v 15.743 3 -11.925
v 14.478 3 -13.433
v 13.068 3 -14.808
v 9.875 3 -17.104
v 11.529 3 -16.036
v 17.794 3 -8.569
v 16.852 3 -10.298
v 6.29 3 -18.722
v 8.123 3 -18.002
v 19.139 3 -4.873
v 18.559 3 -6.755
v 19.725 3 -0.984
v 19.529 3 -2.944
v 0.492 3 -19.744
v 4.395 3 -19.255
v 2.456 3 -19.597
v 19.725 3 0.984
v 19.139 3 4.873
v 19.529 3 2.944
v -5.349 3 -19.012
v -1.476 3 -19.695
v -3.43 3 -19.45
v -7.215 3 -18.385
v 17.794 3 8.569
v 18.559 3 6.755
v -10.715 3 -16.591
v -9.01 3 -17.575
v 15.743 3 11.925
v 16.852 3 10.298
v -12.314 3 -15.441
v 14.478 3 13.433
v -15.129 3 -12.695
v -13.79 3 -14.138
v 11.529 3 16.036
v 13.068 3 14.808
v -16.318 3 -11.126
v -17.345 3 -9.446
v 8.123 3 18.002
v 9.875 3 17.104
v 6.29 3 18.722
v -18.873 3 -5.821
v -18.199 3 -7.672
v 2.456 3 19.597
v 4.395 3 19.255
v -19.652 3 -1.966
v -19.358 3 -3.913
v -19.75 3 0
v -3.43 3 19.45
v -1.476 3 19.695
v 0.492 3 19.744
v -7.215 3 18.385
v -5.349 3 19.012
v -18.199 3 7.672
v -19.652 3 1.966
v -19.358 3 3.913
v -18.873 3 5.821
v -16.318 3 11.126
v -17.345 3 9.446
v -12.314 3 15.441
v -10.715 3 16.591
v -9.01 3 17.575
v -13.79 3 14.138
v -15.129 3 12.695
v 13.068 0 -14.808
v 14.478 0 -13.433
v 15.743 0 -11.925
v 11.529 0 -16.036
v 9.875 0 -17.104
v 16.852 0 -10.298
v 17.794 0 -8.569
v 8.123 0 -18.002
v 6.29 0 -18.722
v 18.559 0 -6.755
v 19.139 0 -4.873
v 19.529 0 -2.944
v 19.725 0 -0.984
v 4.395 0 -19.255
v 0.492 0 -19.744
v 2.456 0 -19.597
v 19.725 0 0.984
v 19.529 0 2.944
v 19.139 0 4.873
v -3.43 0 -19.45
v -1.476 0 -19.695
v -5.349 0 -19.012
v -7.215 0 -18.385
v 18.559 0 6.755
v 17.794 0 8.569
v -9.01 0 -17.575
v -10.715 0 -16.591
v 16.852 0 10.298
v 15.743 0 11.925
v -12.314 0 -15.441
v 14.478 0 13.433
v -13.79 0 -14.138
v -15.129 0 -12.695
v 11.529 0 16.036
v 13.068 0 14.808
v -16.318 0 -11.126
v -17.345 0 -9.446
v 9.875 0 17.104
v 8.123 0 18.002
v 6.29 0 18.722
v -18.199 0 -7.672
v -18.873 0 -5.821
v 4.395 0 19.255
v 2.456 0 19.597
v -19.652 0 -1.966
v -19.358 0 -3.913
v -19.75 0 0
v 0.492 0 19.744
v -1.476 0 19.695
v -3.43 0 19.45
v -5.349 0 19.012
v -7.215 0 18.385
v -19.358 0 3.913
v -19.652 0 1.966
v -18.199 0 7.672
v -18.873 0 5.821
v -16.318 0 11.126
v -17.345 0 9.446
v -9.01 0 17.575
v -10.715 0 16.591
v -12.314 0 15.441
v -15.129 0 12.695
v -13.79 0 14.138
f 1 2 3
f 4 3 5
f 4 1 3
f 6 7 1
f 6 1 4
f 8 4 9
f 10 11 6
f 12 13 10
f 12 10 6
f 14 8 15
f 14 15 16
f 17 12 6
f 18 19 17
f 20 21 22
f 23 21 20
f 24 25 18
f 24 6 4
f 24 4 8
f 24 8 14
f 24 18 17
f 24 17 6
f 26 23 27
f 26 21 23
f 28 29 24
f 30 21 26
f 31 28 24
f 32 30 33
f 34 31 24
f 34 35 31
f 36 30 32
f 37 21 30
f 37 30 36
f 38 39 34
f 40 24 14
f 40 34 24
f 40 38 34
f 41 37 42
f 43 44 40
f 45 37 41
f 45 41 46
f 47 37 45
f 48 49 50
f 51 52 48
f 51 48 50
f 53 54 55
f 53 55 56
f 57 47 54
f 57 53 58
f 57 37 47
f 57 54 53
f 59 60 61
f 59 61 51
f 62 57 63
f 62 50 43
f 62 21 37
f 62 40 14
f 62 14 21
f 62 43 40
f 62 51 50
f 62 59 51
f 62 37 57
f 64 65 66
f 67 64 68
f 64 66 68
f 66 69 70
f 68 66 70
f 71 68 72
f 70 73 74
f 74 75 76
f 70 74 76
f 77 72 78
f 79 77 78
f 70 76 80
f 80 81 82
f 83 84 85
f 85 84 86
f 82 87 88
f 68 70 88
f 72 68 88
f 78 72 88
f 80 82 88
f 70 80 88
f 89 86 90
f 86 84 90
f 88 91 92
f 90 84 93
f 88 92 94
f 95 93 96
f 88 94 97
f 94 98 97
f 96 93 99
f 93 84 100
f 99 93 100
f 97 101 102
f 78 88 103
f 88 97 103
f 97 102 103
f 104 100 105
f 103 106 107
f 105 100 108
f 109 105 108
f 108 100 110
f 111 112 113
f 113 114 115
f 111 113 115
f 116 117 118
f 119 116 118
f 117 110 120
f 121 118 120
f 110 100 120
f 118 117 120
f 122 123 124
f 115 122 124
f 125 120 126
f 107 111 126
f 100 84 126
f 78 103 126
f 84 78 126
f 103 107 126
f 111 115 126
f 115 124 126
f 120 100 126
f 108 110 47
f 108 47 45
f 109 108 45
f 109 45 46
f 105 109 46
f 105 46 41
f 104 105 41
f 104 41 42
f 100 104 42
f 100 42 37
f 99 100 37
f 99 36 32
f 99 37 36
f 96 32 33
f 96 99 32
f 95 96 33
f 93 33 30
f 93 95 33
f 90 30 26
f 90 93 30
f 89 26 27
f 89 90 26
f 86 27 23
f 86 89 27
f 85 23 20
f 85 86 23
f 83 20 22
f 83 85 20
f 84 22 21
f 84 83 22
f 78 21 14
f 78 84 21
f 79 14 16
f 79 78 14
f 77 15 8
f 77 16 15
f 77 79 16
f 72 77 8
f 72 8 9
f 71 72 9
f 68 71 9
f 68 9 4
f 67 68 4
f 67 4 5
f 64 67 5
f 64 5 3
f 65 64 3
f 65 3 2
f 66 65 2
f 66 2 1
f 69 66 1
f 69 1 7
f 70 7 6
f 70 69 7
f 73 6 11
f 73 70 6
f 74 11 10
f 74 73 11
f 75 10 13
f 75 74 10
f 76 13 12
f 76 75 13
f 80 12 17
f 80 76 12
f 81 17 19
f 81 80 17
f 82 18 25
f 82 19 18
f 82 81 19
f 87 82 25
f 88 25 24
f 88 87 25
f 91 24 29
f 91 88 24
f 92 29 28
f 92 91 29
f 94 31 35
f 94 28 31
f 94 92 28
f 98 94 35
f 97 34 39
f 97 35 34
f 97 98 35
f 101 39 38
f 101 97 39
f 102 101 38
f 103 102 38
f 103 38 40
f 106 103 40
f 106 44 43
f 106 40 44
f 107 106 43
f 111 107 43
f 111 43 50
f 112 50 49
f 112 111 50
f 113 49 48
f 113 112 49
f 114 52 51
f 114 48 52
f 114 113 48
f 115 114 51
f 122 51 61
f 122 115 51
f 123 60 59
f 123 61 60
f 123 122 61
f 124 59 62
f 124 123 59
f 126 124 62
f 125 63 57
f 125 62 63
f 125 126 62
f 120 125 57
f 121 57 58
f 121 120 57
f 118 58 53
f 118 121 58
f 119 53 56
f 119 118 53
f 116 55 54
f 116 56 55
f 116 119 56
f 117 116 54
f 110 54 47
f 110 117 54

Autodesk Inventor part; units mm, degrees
ref_plane "YZ Plane" through (0, 0, 0) normal (1, 0, 0) x (0, 1, 0)
ref_plane "XZ Plane" through (0, 0, 0) normal (0, 1, 0) x (-1, 0, 0)
ref_plane "XY Plane" through (0, 0, 0) normal (0, 0, 1) x (1, 0, 0)
sketch "Skizze1" plane through (0, 0, 0) normal (0, 1, 0) x (-1, 0, 0)
  circle A0 centre (0, 0) radius 19.25
  circle A1 centre (0, 0) radius 19.75
  dimension "d0" = 38.5
  dimension "d1" = 0.5
extrude "Extrusion1" add sketch "Skizze1" along normal blind 3
sketch "Skizze2" plane through (0, 3, 0) normal (0, 1, 0) x (1, 0, 0)
  circle A0 centre (0, 0) radius 19.75 projected
  line L0 (-10.9514, -0.5507) -> (-9.9514, -0.5507) construction
  circle A1 centre (0, 0) radius 19.75 projected
  circle A2 centre (0, 0) radius 19.25 projected
  arc A3 (-10.1928, -0.3825) -> (-10.1928, 0.3825) centre (-9.7907, 0) ccw
  circle A4 centre (0, 0) radius 19.25 projected
  arc A5 (-9.9638, 0.85) -> (-9.7216, 0.5507) centre (-9.687, 0.8264) ccw
  arc A6 (-9.7216, -0.5507) -> (-9.9638, -0.85) centre (-9.687, -0.8264) ccw
  point P0 (-9.9865, 0.5193)
  point P1 (-9.9865, -0.5193)
  point P2 (-9.9865, 0.5193)
  point P3 (-9.9865, -0.5193)
  point P4 (-9.9638, 0.85)
  dimension "d9" = 1.11
  dimension "d10" = 0
  dimension "d11" = 1.7
  dimension "d12" = 0.85
  dimension "d14" = 9.7907
extrude "Extrusion2" add sketch "Skizze2" against normal up to surface (3 mm away) contours A2
pattern_circular "Runde Anordnung1" count 31 over 360 about axis through (0, 0, 0) along (0, 1, 0) of "Extrusion2"
equation "\"d12\" = 0.5 * d11"
properties part number "30_Cube_Z_Focus_MGN_NEMA_timingbelt_v3"
